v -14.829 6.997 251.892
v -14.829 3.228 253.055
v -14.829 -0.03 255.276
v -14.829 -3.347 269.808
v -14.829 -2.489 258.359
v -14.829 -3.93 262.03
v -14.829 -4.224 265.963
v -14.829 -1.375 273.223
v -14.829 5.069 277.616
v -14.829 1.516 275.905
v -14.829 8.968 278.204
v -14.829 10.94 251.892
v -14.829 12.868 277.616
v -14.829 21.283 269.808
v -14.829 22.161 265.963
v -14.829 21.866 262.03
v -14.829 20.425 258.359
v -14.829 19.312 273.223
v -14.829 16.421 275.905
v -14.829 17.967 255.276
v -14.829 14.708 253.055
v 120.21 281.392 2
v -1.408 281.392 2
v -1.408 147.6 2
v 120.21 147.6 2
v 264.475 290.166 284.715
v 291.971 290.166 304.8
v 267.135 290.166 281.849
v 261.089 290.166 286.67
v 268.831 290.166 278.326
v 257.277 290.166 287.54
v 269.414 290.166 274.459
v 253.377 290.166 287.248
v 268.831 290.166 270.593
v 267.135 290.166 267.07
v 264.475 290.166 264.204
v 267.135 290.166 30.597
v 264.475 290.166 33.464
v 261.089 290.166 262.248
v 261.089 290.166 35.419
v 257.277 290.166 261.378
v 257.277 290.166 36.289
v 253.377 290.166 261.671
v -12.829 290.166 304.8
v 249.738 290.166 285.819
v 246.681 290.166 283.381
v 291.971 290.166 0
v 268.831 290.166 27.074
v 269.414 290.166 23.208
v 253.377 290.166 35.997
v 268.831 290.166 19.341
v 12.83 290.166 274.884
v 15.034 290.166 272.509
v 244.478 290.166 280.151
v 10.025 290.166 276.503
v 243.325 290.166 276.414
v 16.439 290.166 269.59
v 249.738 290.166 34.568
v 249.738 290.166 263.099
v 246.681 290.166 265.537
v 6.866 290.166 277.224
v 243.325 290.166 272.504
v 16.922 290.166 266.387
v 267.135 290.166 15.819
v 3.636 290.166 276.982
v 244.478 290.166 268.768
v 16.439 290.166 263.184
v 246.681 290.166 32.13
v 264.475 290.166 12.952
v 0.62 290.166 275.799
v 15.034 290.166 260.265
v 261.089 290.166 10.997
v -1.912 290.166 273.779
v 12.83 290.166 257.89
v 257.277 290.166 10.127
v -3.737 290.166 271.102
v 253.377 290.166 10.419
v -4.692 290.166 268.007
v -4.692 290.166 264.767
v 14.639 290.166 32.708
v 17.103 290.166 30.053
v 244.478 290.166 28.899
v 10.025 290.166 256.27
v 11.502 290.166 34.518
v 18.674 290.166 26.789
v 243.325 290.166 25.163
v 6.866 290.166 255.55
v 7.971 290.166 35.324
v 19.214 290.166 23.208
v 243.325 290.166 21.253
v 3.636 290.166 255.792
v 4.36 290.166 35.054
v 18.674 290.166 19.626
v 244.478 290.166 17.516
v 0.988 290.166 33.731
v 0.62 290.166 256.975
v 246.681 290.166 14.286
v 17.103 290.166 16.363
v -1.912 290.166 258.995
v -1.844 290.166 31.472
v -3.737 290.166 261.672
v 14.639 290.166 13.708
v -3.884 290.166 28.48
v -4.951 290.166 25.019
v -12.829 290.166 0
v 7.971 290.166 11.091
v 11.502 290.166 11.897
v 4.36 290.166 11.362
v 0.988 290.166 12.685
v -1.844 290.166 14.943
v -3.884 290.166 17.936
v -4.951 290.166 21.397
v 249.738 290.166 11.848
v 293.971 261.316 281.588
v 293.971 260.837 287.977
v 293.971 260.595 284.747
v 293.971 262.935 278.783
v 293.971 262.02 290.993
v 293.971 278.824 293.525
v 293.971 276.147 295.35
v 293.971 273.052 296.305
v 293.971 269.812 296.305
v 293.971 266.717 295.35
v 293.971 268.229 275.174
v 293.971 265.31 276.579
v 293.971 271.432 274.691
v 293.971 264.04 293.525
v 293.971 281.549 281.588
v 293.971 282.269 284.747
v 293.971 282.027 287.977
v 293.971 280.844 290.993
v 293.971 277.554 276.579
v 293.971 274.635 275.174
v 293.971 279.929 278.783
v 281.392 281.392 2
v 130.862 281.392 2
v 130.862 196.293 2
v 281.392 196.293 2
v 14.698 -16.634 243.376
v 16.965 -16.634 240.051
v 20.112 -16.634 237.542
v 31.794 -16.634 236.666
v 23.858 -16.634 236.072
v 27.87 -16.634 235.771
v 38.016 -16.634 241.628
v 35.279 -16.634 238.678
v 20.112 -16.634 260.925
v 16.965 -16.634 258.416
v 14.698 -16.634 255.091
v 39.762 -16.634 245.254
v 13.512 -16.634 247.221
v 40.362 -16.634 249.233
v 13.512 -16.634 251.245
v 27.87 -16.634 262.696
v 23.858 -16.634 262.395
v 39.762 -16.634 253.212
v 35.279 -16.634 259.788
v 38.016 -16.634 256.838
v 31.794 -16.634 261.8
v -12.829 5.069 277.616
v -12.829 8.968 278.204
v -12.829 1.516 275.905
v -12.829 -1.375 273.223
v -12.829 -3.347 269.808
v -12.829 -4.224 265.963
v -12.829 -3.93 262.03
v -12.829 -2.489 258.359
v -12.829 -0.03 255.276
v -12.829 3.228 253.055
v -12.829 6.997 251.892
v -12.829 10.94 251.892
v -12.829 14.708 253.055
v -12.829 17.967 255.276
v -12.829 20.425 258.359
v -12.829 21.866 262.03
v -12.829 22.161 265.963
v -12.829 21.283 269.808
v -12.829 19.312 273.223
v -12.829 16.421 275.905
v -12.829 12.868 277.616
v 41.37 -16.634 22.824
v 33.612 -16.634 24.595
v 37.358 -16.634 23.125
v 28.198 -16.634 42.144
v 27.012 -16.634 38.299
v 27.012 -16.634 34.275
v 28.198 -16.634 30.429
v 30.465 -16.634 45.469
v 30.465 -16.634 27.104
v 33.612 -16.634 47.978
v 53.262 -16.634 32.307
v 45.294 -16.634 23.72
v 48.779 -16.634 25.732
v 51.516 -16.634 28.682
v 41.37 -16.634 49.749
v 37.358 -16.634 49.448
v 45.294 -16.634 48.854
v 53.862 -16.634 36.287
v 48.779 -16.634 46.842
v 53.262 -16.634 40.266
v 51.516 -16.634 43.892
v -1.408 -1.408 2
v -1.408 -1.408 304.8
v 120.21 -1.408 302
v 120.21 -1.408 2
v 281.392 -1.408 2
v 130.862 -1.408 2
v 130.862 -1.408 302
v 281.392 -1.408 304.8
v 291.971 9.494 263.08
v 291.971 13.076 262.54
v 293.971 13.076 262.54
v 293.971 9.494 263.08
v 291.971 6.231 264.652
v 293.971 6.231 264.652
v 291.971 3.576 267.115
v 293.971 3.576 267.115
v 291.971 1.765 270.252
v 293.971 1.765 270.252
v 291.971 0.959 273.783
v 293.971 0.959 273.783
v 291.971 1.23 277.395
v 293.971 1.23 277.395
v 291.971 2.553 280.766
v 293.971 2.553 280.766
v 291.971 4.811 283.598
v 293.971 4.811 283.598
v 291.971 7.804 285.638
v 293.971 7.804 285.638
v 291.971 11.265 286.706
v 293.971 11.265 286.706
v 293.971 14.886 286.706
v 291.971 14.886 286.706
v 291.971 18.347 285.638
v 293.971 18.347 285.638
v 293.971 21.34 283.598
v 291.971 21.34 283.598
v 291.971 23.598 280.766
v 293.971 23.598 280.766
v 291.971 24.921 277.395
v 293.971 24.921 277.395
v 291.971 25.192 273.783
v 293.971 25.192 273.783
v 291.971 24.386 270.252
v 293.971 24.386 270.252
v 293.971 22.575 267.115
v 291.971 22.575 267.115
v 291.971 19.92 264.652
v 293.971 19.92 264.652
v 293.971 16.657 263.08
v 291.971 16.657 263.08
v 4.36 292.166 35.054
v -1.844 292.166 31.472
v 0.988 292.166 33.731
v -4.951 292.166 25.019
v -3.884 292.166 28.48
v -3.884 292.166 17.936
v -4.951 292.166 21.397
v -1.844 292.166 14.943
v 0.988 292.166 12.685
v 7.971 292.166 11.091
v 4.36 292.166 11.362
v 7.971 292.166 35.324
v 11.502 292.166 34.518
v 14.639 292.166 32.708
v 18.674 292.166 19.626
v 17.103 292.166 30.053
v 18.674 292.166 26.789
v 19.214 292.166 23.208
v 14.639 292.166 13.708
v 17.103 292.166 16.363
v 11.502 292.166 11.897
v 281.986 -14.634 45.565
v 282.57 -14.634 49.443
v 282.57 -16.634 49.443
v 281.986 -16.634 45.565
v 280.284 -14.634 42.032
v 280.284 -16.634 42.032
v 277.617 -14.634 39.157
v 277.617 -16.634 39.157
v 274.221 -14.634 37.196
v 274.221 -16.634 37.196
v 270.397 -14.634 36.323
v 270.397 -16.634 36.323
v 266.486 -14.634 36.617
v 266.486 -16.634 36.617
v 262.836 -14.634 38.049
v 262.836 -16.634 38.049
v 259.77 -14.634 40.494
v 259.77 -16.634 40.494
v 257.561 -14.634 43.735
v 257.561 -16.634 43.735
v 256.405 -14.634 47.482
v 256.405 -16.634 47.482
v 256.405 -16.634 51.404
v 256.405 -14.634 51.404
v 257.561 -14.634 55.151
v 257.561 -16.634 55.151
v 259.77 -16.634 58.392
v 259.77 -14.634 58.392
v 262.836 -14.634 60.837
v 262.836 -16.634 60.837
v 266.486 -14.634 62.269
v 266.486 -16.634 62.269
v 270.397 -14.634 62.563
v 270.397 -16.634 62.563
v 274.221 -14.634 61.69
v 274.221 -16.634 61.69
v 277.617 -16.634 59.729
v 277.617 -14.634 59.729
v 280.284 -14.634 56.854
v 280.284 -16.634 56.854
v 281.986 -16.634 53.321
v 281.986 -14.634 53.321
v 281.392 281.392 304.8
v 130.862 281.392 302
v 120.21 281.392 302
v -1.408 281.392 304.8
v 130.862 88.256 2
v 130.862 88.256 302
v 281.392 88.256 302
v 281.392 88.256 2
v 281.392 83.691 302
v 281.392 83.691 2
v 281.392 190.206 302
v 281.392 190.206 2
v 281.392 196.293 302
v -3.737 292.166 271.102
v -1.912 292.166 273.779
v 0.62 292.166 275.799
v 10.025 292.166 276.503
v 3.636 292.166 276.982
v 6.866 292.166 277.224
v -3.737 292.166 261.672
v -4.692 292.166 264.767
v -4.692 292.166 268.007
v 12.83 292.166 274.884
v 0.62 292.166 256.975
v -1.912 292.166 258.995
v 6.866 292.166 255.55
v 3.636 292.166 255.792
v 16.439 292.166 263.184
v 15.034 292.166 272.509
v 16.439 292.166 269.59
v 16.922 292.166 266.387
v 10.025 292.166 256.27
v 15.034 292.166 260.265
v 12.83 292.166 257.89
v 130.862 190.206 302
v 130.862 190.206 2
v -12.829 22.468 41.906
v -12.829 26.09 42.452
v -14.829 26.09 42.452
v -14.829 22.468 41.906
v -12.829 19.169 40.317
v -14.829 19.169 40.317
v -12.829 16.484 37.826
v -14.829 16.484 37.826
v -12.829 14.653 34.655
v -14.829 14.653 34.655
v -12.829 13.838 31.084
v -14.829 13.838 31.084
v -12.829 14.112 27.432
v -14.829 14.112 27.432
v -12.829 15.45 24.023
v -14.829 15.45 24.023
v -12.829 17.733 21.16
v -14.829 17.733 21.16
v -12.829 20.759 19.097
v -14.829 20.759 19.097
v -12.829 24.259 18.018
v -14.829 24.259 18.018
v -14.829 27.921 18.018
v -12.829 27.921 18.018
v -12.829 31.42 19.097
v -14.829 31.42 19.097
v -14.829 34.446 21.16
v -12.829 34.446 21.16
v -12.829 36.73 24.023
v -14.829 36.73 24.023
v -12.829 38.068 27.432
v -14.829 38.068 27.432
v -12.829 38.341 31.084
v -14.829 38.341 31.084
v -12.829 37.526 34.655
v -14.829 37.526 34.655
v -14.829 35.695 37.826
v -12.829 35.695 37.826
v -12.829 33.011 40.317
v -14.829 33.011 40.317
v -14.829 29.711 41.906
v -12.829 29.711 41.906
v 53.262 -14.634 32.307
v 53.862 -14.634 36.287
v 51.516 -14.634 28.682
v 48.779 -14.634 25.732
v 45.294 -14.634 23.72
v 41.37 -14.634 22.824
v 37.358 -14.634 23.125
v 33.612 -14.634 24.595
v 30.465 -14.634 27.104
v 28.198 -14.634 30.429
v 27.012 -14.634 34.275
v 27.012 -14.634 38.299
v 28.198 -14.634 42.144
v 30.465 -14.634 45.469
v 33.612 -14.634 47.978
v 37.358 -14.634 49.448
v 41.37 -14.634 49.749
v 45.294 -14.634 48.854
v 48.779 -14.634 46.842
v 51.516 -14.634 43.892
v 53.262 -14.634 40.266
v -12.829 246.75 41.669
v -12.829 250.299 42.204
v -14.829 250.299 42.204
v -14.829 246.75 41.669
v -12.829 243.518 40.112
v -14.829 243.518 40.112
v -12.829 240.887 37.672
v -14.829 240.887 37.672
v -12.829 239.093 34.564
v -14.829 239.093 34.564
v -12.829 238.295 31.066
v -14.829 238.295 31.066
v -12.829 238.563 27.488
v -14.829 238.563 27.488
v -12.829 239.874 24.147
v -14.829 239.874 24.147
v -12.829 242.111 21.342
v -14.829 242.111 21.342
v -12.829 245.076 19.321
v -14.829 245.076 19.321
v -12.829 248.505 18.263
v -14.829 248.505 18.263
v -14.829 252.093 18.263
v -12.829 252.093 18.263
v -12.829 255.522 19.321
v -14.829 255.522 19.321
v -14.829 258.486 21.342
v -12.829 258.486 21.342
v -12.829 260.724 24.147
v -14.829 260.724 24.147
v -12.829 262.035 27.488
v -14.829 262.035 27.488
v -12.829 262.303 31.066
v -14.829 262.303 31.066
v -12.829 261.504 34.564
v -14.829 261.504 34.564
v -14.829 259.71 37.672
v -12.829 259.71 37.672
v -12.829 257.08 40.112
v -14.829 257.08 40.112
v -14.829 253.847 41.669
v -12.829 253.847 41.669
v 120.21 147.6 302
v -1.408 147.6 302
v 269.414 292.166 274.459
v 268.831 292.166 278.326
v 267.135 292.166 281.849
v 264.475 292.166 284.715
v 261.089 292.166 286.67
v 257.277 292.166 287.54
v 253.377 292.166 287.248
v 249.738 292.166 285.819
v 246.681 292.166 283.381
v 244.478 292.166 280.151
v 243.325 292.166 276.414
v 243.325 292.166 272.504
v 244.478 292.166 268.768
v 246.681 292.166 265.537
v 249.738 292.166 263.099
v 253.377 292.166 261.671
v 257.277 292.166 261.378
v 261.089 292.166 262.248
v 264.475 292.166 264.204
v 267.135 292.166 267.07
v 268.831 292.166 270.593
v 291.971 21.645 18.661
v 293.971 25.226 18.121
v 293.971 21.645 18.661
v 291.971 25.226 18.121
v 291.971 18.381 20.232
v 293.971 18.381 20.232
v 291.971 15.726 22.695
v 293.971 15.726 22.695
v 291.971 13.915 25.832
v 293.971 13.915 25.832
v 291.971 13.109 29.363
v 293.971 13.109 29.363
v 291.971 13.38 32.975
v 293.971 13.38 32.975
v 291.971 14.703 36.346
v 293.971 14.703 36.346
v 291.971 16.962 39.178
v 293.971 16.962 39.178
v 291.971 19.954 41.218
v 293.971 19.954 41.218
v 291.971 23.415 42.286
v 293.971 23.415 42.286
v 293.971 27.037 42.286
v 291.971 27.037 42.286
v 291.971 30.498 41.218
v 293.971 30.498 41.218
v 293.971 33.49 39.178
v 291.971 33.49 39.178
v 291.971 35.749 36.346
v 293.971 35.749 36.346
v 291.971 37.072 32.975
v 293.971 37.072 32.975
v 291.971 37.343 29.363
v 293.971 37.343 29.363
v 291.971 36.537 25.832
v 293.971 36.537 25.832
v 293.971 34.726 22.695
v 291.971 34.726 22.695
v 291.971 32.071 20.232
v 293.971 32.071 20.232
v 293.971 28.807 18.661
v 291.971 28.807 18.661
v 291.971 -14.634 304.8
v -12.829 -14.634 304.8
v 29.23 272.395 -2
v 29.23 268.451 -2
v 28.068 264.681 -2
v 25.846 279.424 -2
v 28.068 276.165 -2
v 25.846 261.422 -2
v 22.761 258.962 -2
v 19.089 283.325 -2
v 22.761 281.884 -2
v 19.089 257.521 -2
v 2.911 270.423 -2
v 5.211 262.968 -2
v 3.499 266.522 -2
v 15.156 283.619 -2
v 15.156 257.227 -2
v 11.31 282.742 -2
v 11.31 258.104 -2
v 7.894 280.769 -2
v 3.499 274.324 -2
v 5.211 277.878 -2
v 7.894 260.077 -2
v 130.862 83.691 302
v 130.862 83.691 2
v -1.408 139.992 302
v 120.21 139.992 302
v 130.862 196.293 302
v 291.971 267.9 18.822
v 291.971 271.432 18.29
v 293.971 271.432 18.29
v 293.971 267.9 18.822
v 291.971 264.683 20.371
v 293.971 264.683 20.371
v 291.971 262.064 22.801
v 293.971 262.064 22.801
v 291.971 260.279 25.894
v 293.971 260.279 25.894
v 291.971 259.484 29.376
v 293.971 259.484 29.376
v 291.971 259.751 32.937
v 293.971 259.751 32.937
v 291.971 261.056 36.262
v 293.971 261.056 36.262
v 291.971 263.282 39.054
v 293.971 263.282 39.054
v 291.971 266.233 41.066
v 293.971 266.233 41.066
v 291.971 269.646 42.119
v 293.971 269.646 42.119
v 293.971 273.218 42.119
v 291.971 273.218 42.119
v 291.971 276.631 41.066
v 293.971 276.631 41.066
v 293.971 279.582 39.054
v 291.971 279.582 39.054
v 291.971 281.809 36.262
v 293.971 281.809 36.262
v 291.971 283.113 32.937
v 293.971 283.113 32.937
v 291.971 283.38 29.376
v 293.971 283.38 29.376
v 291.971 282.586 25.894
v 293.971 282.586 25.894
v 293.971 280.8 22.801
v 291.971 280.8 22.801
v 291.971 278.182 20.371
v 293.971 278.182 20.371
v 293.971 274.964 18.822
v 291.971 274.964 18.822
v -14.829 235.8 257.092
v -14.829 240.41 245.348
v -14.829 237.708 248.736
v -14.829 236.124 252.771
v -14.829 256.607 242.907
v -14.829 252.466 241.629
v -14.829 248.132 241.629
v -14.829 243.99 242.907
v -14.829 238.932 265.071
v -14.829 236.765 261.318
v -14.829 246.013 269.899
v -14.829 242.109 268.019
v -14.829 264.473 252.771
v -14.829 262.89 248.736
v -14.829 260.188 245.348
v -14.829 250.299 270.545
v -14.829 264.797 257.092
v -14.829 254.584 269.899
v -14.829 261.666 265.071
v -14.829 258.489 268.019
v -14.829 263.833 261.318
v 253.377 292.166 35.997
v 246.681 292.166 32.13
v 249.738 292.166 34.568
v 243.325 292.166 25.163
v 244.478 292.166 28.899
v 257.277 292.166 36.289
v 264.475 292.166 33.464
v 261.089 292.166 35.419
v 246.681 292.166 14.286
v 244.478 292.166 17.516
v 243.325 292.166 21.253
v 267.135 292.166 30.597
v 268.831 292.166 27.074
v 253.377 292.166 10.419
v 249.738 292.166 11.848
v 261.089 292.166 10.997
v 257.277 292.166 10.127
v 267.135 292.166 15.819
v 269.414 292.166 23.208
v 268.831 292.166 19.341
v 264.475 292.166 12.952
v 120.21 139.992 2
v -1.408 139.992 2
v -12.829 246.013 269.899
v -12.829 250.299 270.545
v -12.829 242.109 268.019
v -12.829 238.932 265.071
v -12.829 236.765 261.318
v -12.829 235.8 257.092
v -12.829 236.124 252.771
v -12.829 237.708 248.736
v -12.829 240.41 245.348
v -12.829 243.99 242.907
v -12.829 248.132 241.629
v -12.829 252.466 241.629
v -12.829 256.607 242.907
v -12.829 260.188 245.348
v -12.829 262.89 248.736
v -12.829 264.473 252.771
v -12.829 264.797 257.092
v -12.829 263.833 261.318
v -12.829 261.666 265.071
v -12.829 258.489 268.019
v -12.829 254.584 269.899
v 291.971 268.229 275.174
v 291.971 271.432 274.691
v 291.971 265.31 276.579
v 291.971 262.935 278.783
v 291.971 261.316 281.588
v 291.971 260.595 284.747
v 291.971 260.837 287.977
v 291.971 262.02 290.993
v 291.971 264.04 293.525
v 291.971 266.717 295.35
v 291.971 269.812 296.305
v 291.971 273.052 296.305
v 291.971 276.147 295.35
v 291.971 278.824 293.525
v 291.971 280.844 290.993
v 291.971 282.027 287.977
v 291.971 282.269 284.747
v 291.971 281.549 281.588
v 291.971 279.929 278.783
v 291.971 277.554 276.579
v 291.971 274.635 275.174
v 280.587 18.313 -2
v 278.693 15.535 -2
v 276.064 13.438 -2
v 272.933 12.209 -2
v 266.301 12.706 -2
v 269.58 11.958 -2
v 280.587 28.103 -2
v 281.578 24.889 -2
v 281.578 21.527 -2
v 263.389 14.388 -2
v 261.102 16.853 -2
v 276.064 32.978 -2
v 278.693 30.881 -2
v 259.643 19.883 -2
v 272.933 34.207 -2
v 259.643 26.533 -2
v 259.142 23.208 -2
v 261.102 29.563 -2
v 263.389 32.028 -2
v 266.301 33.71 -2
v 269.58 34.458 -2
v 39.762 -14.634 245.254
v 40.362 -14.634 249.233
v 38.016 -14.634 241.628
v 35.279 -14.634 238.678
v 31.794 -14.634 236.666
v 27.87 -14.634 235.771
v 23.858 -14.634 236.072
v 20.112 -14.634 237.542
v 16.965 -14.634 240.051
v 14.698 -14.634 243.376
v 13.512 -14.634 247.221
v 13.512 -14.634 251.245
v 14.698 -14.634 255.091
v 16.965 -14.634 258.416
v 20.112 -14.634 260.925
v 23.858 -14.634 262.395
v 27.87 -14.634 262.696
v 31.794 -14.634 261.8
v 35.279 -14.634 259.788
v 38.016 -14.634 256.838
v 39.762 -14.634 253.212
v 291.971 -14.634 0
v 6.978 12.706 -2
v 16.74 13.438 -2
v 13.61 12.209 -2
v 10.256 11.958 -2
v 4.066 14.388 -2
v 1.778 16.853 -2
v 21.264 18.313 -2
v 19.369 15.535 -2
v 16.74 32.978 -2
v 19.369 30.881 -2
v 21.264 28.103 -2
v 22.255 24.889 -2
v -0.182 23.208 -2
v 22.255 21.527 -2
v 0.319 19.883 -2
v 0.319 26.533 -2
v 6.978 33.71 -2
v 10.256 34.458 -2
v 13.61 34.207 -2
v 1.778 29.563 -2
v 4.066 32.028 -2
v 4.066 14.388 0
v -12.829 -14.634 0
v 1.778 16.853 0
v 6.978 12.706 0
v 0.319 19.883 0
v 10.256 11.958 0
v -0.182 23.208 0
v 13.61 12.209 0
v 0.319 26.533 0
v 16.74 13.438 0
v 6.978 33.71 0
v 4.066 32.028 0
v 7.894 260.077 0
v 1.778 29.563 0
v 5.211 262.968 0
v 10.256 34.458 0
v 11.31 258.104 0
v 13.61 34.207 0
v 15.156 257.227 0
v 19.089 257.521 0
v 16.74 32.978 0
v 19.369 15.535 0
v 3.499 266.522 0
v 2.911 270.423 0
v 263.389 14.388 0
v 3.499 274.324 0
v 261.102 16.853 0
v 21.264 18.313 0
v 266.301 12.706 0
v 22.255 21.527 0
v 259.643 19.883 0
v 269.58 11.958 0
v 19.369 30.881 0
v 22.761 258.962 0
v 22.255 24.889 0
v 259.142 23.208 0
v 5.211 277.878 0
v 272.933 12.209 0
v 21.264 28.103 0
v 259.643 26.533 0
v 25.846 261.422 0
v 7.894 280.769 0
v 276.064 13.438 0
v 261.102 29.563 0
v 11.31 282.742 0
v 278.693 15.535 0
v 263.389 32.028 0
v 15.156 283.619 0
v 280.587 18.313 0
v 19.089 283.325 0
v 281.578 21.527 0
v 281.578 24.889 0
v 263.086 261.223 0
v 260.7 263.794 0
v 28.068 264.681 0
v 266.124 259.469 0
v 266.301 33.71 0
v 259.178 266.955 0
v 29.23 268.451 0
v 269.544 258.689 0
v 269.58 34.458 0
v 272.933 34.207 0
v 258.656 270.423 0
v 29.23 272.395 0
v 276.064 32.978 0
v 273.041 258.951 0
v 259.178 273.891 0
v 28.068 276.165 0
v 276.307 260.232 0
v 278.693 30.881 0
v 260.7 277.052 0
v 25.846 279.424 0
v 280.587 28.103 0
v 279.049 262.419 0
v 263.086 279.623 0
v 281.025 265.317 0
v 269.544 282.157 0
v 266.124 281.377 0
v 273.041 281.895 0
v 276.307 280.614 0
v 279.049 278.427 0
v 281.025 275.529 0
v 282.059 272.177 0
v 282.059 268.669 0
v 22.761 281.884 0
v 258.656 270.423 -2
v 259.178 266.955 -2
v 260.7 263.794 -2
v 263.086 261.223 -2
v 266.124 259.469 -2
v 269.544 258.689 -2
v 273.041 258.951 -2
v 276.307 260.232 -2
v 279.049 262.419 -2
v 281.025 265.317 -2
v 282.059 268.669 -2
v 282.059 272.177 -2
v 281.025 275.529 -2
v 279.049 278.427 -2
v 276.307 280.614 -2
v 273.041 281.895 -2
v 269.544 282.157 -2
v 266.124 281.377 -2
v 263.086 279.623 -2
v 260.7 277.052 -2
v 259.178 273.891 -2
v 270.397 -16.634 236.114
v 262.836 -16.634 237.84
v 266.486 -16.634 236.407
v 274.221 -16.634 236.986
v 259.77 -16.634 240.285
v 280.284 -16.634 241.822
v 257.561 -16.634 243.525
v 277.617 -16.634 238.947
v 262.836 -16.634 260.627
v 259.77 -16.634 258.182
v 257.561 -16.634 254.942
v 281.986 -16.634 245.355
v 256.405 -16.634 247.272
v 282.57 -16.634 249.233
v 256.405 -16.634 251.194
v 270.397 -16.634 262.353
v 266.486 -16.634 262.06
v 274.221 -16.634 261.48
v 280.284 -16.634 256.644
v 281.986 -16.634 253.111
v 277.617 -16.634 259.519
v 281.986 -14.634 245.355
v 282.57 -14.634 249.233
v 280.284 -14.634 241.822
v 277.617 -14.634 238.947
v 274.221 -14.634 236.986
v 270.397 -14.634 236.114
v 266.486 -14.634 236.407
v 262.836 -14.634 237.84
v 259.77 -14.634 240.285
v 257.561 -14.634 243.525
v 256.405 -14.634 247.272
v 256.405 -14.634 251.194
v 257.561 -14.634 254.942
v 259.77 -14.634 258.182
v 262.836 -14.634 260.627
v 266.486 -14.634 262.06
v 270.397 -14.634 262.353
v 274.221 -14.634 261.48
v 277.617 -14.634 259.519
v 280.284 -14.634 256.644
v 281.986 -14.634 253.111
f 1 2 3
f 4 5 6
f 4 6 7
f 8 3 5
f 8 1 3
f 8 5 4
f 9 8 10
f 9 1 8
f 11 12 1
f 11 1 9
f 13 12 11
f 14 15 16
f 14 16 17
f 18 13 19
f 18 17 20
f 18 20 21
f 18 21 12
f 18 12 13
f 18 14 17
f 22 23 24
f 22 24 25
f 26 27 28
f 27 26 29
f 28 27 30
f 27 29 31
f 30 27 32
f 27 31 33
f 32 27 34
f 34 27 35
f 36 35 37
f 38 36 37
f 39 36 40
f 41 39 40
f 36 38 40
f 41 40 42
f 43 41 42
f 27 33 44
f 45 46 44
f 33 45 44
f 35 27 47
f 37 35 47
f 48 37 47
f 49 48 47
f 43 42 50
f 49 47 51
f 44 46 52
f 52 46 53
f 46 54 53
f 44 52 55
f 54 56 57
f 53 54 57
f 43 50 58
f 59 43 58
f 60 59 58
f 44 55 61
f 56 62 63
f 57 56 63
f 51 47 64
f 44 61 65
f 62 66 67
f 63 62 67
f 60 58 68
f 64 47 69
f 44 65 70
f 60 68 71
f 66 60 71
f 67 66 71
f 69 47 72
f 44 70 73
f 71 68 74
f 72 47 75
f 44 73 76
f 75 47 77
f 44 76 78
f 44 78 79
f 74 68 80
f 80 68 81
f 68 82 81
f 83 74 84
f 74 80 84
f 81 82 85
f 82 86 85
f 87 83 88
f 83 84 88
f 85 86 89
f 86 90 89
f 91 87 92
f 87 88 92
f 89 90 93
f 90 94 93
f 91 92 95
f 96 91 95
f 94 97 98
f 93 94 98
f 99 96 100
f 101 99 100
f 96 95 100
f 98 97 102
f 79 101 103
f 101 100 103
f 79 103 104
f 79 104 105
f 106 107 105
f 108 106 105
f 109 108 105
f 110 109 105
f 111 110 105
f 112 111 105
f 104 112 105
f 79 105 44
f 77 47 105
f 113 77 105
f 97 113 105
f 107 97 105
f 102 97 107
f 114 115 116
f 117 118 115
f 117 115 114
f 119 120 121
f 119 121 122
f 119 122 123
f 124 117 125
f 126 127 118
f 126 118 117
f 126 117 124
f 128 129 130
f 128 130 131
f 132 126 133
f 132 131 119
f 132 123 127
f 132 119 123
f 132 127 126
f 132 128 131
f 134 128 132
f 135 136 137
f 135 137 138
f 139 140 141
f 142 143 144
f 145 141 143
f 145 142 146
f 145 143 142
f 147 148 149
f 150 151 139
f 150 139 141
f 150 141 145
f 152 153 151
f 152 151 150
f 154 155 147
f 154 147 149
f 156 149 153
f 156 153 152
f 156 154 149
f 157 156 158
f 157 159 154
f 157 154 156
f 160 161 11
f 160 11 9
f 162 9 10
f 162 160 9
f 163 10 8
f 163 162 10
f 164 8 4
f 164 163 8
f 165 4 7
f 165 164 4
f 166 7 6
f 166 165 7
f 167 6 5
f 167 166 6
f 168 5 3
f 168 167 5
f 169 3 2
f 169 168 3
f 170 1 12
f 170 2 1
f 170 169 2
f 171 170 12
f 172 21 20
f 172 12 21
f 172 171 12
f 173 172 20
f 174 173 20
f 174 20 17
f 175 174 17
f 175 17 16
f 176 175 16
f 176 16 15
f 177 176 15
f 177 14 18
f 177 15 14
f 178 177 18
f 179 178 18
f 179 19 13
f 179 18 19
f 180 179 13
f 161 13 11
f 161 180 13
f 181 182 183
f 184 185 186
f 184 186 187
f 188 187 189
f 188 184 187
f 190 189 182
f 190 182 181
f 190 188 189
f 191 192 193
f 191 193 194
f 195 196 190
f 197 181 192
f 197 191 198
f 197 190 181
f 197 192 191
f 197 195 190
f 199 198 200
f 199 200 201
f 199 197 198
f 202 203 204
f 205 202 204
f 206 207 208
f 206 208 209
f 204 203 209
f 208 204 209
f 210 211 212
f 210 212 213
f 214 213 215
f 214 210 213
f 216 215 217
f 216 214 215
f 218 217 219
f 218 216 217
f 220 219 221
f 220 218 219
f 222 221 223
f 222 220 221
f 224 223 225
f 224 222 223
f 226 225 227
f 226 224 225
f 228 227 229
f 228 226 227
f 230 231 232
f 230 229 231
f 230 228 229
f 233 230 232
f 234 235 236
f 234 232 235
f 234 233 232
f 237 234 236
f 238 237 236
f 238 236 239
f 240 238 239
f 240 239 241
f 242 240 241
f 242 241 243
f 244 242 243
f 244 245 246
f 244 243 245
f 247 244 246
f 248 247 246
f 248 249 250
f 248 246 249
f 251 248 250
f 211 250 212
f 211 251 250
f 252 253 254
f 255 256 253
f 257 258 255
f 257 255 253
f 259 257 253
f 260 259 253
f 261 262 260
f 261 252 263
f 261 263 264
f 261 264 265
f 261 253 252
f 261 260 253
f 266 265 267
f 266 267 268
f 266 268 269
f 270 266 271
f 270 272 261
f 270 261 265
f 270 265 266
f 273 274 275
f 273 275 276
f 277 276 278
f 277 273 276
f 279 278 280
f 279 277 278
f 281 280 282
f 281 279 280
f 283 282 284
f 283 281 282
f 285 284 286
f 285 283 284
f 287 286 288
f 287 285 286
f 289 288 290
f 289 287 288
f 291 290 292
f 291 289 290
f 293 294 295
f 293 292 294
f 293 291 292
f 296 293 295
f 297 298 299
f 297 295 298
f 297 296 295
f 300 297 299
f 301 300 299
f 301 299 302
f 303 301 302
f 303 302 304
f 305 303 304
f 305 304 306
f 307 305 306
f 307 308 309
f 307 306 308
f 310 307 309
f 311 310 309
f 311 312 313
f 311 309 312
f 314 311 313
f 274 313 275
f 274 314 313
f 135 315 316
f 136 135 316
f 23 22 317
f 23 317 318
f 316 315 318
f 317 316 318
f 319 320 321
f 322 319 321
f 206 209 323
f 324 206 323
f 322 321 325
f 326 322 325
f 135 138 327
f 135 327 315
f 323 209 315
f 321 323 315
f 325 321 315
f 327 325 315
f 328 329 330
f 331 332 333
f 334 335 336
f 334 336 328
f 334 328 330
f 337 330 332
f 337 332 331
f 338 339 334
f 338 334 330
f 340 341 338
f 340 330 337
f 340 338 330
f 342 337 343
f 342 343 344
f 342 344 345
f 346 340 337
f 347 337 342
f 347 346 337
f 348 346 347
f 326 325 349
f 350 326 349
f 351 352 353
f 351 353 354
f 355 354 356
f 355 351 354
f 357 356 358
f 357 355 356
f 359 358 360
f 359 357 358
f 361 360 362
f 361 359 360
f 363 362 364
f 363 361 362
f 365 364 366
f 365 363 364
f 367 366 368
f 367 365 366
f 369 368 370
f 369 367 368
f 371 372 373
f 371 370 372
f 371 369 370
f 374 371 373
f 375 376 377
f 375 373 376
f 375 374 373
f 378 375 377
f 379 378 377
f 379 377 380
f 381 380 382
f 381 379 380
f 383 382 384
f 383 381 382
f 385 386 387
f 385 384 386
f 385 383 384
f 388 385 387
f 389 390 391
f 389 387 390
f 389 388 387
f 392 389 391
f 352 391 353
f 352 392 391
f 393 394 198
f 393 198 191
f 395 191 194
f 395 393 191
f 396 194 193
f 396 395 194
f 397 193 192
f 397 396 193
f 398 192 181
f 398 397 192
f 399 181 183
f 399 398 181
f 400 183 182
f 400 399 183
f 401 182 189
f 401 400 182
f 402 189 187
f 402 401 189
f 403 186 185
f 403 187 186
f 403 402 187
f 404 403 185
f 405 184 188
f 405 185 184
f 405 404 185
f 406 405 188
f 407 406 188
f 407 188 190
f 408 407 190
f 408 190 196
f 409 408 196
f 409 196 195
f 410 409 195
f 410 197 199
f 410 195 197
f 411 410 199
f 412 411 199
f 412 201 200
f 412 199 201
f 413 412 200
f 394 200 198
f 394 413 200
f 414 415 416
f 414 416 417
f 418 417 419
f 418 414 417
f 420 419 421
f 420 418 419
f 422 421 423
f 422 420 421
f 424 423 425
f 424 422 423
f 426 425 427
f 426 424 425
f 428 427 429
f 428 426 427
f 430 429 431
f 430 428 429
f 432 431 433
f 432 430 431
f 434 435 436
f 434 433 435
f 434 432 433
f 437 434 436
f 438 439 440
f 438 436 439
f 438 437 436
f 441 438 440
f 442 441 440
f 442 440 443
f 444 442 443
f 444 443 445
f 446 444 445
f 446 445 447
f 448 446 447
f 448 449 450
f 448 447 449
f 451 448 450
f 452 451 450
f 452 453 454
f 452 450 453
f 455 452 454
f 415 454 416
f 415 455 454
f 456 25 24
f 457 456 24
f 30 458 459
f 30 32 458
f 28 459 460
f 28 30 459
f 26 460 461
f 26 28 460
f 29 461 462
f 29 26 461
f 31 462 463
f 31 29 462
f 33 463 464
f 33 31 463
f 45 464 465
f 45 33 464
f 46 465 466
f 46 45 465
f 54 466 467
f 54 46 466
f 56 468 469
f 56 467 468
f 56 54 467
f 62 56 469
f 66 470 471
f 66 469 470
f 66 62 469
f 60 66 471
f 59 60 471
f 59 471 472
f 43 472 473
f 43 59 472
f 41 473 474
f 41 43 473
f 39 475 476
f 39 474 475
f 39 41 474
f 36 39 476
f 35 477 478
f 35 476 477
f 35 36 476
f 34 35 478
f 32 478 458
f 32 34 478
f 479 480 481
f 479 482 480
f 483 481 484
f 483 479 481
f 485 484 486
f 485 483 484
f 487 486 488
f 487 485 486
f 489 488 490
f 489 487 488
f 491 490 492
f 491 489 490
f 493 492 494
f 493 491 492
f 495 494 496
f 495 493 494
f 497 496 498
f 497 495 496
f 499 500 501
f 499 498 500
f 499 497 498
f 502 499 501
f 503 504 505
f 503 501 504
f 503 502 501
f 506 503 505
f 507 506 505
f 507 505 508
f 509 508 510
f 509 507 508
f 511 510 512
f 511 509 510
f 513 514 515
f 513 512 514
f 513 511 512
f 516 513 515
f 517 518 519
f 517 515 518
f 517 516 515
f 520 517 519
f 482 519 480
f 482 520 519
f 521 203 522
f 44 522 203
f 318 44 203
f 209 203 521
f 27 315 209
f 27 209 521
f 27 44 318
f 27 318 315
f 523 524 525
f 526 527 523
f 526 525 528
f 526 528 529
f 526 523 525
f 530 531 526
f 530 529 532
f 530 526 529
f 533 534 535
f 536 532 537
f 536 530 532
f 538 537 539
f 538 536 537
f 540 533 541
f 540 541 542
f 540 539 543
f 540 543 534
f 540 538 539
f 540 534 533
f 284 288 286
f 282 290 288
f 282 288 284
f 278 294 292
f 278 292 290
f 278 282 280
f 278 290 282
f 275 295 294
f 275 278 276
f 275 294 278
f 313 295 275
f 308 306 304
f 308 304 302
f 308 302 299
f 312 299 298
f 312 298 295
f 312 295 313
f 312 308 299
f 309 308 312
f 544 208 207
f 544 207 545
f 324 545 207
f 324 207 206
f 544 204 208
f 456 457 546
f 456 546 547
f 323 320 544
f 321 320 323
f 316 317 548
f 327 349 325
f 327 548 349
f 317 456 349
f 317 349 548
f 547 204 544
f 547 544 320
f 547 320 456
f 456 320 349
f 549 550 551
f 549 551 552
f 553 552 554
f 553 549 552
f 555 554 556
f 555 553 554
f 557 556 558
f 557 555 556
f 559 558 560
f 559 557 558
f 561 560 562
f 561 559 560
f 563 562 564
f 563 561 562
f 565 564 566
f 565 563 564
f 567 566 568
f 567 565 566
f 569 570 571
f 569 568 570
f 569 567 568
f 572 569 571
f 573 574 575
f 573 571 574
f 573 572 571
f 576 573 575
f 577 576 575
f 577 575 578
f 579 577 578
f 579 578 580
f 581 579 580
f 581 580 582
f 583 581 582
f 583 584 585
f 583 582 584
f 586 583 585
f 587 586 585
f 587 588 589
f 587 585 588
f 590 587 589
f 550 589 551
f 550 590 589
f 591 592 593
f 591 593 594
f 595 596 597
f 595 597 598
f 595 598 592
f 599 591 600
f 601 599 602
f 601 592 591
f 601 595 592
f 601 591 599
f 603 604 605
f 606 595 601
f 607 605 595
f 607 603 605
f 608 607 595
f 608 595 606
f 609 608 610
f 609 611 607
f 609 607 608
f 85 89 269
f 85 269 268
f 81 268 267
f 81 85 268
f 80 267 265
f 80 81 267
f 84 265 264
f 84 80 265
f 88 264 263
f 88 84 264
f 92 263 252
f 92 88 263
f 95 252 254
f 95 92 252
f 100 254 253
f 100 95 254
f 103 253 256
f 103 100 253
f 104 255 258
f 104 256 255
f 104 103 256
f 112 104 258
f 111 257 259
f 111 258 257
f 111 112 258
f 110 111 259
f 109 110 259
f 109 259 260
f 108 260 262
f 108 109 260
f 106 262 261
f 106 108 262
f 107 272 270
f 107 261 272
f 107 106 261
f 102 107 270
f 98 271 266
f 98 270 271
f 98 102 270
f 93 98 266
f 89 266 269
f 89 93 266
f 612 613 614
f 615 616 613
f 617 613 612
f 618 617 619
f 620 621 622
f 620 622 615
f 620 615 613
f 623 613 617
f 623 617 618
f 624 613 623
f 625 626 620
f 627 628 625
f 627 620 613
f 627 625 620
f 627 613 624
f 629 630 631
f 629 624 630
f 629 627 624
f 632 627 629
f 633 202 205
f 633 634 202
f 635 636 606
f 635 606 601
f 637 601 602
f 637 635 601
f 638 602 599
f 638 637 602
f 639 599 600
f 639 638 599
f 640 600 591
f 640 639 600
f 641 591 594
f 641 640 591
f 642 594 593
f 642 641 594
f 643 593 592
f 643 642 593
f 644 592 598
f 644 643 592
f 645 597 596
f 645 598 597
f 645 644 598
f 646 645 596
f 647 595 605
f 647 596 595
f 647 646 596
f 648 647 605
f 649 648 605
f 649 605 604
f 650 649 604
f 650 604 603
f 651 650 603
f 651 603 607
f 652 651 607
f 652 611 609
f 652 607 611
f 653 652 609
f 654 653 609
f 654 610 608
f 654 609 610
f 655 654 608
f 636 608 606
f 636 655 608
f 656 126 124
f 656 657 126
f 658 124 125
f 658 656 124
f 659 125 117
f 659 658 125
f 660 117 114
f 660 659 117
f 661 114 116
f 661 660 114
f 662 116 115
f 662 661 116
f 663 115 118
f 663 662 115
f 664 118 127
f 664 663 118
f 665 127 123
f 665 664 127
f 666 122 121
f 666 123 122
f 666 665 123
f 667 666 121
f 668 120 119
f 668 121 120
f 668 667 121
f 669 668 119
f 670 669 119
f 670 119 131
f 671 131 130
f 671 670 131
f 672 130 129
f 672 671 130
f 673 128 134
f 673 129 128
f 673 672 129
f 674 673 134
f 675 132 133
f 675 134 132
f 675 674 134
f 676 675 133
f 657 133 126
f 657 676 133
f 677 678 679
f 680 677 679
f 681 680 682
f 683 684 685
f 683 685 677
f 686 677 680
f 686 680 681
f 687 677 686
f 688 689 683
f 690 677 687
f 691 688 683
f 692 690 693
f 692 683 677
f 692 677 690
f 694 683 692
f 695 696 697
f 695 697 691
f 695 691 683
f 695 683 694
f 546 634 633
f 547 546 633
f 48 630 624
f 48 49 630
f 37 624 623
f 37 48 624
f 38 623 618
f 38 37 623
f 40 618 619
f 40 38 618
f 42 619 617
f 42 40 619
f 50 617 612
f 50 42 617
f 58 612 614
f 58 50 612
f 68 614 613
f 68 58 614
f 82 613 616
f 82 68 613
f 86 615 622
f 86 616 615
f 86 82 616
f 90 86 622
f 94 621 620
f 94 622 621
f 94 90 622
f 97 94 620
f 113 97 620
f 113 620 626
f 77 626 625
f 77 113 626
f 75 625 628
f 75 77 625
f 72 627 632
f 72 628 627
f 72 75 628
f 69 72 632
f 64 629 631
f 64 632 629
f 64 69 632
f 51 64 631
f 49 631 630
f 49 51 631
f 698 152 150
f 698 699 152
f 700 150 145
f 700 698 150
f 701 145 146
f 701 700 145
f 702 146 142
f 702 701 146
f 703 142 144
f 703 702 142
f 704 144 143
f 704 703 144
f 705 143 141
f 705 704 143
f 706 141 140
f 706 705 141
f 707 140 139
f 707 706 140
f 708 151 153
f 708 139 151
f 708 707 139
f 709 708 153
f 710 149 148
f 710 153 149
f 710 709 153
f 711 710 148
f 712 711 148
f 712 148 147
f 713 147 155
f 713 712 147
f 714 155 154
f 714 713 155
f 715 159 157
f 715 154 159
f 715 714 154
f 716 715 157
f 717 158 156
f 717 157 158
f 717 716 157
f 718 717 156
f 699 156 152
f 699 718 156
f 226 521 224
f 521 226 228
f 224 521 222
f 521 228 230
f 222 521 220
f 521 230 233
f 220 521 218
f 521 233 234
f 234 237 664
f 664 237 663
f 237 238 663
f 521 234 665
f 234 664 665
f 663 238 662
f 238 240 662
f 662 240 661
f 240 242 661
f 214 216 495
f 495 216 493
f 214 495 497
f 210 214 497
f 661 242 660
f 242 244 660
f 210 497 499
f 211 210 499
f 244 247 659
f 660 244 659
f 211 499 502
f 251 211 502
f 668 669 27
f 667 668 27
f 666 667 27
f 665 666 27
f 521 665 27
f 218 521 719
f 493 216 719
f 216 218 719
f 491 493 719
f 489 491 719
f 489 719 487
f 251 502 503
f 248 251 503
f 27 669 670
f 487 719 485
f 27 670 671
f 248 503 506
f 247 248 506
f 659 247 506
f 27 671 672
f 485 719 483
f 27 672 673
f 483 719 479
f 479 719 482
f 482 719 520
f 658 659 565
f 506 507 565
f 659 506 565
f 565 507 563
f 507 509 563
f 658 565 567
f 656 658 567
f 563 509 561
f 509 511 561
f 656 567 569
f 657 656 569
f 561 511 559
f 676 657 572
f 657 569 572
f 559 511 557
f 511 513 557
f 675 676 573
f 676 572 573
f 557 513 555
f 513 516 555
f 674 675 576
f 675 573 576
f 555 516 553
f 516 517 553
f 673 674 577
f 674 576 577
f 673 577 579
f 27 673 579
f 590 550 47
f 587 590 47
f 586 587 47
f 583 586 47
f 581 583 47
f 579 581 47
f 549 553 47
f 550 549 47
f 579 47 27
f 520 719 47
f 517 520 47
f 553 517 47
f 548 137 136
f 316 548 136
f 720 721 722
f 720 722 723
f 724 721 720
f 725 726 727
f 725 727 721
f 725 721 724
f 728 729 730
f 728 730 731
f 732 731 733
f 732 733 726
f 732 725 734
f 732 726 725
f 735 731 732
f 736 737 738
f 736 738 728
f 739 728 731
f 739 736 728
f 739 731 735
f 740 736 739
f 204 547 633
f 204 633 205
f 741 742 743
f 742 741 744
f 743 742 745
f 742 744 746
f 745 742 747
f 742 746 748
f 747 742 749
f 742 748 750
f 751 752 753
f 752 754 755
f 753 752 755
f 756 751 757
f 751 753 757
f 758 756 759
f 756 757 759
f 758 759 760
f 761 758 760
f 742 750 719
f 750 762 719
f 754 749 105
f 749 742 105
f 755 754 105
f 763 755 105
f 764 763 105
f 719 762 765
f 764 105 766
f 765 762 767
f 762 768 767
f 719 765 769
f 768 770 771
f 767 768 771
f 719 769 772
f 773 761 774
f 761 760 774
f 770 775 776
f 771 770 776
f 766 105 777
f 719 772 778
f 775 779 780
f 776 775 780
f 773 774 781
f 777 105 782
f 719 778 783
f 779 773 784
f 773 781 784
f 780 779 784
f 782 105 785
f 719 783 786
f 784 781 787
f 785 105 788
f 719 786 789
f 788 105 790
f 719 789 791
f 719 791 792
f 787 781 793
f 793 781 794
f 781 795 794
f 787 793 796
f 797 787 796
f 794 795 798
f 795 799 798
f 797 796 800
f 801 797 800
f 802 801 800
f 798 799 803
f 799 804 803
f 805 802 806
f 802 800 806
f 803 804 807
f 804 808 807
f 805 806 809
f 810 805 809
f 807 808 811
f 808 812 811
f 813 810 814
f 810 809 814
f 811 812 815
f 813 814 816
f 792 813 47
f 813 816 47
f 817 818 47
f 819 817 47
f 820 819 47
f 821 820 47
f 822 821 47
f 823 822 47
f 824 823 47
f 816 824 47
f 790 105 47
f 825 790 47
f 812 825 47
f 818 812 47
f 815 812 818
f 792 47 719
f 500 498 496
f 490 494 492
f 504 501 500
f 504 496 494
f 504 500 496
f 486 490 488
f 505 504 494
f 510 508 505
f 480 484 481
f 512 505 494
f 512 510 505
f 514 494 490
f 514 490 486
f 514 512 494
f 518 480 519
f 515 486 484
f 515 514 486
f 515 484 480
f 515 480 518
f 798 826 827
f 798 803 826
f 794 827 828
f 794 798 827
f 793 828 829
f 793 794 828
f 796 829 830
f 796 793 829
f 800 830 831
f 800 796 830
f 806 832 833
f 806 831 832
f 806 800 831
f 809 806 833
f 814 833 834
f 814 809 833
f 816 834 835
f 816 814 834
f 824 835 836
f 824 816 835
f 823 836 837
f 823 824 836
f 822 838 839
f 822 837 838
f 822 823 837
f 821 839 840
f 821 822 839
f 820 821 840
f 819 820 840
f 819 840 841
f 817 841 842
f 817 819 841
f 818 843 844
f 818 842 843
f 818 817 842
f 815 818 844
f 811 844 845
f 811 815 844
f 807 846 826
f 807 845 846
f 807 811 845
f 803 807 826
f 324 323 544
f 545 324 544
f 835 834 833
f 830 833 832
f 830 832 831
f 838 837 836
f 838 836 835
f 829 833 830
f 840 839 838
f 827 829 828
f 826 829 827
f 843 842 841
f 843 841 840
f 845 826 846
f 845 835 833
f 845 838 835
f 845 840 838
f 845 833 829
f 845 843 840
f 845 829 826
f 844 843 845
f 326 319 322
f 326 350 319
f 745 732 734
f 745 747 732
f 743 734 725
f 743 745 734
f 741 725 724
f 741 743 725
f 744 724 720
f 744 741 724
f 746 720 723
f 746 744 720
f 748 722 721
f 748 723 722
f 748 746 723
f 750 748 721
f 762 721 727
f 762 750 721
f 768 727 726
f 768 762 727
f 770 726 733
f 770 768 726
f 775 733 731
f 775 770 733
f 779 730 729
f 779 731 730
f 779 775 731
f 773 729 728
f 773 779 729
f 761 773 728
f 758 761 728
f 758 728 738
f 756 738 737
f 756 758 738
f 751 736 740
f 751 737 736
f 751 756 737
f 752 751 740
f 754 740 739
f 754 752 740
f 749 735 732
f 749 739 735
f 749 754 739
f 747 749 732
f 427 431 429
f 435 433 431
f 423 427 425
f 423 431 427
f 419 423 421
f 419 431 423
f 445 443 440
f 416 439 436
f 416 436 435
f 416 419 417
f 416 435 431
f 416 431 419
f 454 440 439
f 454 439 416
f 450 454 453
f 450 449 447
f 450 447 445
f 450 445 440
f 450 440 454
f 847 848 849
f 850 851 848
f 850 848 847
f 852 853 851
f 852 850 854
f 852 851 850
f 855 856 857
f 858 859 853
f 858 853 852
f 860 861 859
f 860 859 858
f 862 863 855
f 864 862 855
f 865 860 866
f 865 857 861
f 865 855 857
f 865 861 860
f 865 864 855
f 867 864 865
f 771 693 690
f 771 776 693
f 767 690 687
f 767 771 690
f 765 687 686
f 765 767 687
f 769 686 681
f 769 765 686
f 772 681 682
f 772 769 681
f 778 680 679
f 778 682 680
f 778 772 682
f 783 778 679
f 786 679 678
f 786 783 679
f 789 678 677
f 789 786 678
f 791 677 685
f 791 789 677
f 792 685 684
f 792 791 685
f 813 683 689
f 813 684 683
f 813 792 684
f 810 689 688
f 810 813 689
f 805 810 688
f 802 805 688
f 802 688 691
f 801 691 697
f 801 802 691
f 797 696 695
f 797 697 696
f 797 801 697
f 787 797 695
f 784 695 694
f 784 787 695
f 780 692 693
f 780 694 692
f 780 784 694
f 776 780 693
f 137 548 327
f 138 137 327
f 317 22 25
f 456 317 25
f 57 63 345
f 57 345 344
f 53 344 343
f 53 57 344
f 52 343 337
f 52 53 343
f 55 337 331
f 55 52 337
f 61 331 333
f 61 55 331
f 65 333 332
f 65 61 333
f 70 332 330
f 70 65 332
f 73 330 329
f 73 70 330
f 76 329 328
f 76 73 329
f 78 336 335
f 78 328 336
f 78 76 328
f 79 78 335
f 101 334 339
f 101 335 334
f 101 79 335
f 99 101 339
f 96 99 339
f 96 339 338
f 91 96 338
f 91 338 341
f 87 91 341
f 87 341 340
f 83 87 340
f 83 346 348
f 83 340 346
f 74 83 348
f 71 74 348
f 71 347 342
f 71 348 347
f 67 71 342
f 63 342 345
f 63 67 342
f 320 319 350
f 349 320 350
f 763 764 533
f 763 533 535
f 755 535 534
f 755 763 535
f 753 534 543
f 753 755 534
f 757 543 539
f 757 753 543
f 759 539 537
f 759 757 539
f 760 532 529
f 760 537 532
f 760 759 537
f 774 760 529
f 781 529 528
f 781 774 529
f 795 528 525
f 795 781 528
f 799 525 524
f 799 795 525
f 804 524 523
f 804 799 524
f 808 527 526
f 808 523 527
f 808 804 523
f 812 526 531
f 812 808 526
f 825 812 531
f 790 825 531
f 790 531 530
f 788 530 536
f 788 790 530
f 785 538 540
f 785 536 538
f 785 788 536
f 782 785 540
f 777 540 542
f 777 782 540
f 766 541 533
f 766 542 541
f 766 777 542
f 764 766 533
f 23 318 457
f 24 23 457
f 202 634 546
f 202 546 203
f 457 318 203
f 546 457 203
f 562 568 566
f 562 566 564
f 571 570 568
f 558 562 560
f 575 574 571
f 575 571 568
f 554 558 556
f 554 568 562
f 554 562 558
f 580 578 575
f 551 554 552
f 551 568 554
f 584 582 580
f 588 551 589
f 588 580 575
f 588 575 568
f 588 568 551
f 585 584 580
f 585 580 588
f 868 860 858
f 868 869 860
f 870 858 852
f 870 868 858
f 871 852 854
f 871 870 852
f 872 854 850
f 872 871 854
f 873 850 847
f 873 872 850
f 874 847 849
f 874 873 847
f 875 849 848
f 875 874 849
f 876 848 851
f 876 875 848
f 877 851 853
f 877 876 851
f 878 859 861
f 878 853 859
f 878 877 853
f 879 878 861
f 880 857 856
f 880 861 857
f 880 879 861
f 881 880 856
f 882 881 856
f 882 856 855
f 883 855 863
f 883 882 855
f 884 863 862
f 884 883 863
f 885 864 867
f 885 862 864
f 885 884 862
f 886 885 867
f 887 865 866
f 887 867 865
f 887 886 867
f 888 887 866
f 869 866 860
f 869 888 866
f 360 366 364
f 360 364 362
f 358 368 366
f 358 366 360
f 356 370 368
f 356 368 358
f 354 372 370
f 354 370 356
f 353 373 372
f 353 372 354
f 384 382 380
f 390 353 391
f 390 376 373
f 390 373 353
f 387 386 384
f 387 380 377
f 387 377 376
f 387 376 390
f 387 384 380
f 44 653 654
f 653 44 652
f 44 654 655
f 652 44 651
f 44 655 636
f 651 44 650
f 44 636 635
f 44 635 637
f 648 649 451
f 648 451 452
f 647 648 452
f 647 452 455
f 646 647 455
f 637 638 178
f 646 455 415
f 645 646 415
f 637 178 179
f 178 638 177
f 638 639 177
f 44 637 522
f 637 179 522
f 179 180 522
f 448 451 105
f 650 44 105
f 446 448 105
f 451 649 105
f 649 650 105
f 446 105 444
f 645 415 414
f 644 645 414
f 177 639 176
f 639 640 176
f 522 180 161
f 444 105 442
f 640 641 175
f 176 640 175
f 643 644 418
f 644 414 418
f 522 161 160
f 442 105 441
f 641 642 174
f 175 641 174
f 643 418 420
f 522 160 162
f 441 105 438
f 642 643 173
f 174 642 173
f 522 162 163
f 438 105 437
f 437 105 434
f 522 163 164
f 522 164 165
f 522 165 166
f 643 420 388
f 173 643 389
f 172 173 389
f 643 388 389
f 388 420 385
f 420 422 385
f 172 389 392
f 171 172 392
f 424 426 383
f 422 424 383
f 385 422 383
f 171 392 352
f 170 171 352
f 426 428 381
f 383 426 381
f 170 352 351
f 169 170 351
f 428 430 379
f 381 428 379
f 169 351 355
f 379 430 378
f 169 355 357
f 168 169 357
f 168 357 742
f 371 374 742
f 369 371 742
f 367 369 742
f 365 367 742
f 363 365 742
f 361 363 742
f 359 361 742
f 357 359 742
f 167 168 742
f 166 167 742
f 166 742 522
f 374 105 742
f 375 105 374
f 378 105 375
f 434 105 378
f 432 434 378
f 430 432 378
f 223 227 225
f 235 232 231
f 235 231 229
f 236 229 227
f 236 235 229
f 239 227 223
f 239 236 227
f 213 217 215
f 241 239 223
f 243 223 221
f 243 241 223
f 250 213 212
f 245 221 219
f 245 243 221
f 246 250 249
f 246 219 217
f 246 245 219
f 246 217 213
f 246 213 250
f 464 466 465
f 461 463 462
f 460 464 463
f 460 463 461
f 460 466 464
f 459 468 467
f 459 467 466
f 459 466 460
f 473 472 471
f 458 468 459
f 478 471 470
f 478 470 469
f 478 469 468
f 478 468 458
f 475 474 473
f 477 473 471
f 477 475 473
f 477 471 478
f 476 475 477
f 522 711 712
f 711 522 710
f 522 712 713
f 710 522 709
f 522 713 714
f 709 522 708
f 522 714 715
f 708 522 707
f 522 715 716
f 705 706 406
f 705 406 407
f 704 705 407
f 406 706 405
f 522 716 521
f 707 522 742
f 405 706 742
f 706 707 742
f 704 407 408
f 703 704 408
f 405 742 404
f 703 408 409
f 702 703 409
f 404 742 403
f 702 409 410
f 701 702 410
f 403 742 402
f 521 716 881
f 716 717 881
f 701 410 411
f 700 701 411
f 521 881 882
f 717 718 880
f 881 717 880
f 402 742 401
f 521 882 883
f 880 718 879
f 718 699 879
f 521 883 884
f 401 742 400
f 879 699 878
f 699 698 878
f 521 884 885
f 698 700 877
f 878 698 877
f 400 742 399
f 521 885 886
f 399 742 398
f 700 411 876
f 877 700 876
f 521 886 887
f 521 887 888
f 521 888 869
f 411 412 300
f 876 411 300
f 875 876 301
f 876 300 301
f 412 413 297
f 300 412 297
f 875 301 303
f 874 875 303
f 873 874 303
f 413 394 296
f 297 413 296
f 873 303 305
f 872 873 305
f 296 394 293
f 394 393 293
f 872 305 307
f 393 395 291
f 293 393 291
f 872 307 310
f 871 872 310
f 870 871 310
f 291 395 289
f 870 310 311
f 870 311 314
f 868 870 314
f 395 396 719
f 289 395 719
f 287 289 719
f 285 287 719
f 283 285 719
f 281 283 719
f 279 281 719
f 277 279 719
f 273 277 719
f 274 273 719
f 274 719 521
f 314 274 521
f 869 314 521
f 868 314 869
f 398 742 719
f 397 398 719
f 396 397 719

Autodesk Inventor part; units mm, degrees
ref_plane "YZ Plane" through (0, 0, 0) normal (1, 0, 0) x (0, 1, 0)
ref_plane "XZ Plane" through (0, 0, 0) normal (0, 1, 0) x (-1, 0, 0)
ref_plane "XY Plane" through (0, 0, 0) normal (0, 0, 1) x (1, 0, 0)
sketch "Sketch1" plane through (0, 0, 0) normal (0, 0, 1) x (1, 0, 0)
  point P0 (0, 0)
sketch "Sketch2" plane through (0, 0, 0) normal (0, 0, 1) x (1, 0, 0)
  line L0 (-12.8291, 6.9625) -> (-12.8291, -14.6342)
  line L1 (-12.8291, -14.6342) -> (291.9709, -14.6342)
  line L2 (291.9709, -14.6342) -> (291.9709, 290.1658)
  line L3 (291.9709, 290.1658) -> (-12.8291, 290.1658)
  line L4 (-12.8291, 290.1658) -> (-12.8291, -14.6342)
  point P0 (0, 0)
  dimension "d0" = 304.8
  dimension "d1" = 304.8
  dimension "d2" = 304.8
  dimension "d3" = 304.8
extrude "Extrusion1" add sketch "Sketch2" along normal blind 304.8
sketch "Sketch3" plane through (0, 0, 304.8) normal (0, 0, 1) x (1, 0, 0)
  line L0 (-1.4082, -1.4082) -> (281.3918, -1.4082)
  line L1 (281.3918, -1.4082) -> (281.3918, 281.3918)
  line L2 (281.3918, 281.3918) -> (-1.4082, 281.3918)
  line L3 (-1.4082, 281.3918) -> (-1.4082, -1.4082)
  line L4 (-1.4082, -1.4082) -> (281.3918, 281.3918) construction
  line L5 (281.3918, -1.4082) -> (-1.4082, 281.3918) construction
  point P0 (0, 0)
  point P1 (139.9918, 139.9918)
  dimension "d8" = 282.8
  dimension "d9" = 282.8
extrude "Extrusion2" cut sketch "Sketch3" against normal blind 302.8
sketch "Sketch4" plane through (0, 0, 2) normal (0, 0, 1) x (1, 0, 0)
  line L0 (-1.4082, 281.3918) -> (281.3918, 281.3918) projected
  line L1 (120.2104, 281.3918) -> (120.2104, -1.4082)
  line L2 (120.2104, -1.4082) -> (130.8619, -1.4082)
  line L3 (281.3918, -1.4082) -> (-1.4082, -1.4082) projected
  line L4 (130.8619, -1.4082) -> (130.8619, 281.3918)
  line L5 (130.8619, 281.3918) -> (120.2104, 281.3918)
  line L6 (281.3918, 281.3918) -> (281.3918, -1.4082) projected
  line L7 (130.8619, 196.2929) -> (281.3918, 196.2929)
  line L8 (281.3918, 196.2929) -> (281.3918, 190.2063)
  line L9 (281.3918, 190.2063) -> (130.8619, 190.2063)
  line L10 (130.8619, 190.2063) -> (130.8619, 196.2929)
  line L11 (130.8619, 88.2557) -> (281.3918, 88.2557)
  line L12 (281.3918, 88.2557) -> (281.3918, 83.6908)
  line L13 (281.3918, 83.6908) -> (130.8619, 83.6908)
  line L14 (130.8619, 83.6908) -> (130.8619, 88.2557)
  line L15 (-1.4082, -1.4082) -> (-1.4082, 281.3918) projected
  line L16 (-1.4082, 139.9918) -> (120.2104, 139.9918)
  line L17 (120.2104, 139.9918) -> (120.2104, 147.6001)
  line L18 (120.2104, 147.6001) -> (-1.4082, 147.6001)
  line L19 (-1.4082, 147.6001) -> (-1.4082, 139.9918)
  point P0 (0, 0)
  point P1 (-1.4082, 147.6001)
  point P2 (120.2104, 139.9918)
extrude "Extrusion3" add sketch "Sketch4" along normal blind 300 contours L0 L4 L2 L1 | L18 L1 L16 L15 | L7 L6 L9 L4 | L11 L6 L13 L4
sketch "Sketch5" plane through (-1.4082, -1.4082, 304.8) normal (1, 0, 0) x (0, 0, -1)
  line L0 (152.8, 241.4577) -> (224.2375, 241.4577) construction
  line L1 (224.2375, 241.4577) -> (224.2375, 189.864) construction
  line L2 (224.2375, 189.864) -> (152.8, 189.864) construction
  line L3 (152.8, 189.864) -> (152.8, 241.4577) construction
  point P0 (304.8, 1.4082)
sketch "Sketch6" plane through (-1.4082, 281.3918, 304.8) normal (0, -1, 0) x (1, 0, 0)
  line L0 (194.3643, -70.7024) -> (290.2517, -70.7024) construction
  line L1 (290.2517, -70.7024) -> (290.2517, -4.2848) construction
  line L2 (290.2517, -4.2848) -> (194.3643, -4.2848) construction
  line L3 (194.3643, -4.2848) -> (194.3643, -70.7024) construction
  point P0 (1.4082, -304.8)
decal "Decal1"
decal "Decal2"
sketch "Sketch7" plane through (-12.8291, 290.1658, 0) normal (0, 1, 0) x (1, 0, 0)
  circle A0 centre (19.8924, -23.2079) radius 12.1505
  circle A1 centre (269.1255, -23.2079) radius 13.1175
  circle A2 centre (19.8924, -274.4592) radius 7.0633
  circle A3 centre (269.1255, -274.4592) radius 13.1175
  point P0 (12.8291, 0)
sketch "Sketch8" plane through (-12.8291, 290.1658, 0) normal (0, 1, 0) x (1, 0, 0)
  circle A0 centre (18.8833, -266.3869) radius 10.8677
  point P0 (12.8291, 0)
extrude "Extrusion4" add sketch "Sketch8" along normal blind 2
extrude "Extrusion5" add sketch "Sketch7" along normal blind 2 contours A0 | A1 | A3
sketch "Sketch9" plane through (291.9709, -14.6342, 0) normal (1, 0, 0) x (0, 0, -1)
  circle A0 centre (-285.5587, 286.0663) radius 10.8677
  circle A1 centre (-30.2712, 286.0663) radius 11.9817
  circle A2 centre (-30.2712, 39.8602) radius 12.1505
  circle A3 centre (-274.691, 27.7097) radius 12.1505
  point P0 (0, 14.6342)
extrude "Extrusion6" add sketch "Sketch9" along normal blind 2
sketch "Sketch10" plane through (0, 0, 0) normal (0, 0, -1) x (-1, 0, 0)
  circle A0 centre (-270.423, 270.423) radius 11.7673
  circle A1 centre (-16.1447, 270.423) radius 13.2335
  circle A2 centre (-11.0995, 23.208) radius 11.2814
  circle A3 centre (-270.423, 23.208) radius 11.2814
  point P0 (0, 0)
extrude "Extrusion7" add sketch "Sketch10" along normal blind 2
sketch "Sketch11" plane through (-12.8291, -14.6342, 0) normal (0, -1, 0) x (1, 0, 0)
  point P0 (12.8291, 0)
sketch "Sketch12" plane through (-12.8291, -14.6342, 0) normal (0, -1, 0) x (1, 0, 0)
  circle A0 centre (282.2431, 49.443) radius 13.1563
  circle A1 centre (282.2431, 249.2332) radius 13.1563
  circle A2 centre (53.1907, 36.2867) radius 13.5001
  circle A3 centre (39.6907, 249.2332) radius 13.5001
  point P0 (12.8291, 0)
extrude "Extrusion8" add sketch "Sketch12" along normal blind 2
sketch "Sketch13" plane through (-12.8291, -14.6342, 0) normal (-1, 0, 0) x (0, 0, 1)
  circle A0 centre (30.1663, 40.724) radius 12.2858
  circle A1 centre (30.1663, 264.9329) radius 12.0378
  circle A2 centre (256.0059, 264.9329) radius 14.539
  circle A3 centre (264.9742, 23.6025) radius 13.2296
  point P0 (0, 14.6342)
extrude "Extrusion9" add sketch "Sketch13" along normal blind 2
properties part number "locker 2"
